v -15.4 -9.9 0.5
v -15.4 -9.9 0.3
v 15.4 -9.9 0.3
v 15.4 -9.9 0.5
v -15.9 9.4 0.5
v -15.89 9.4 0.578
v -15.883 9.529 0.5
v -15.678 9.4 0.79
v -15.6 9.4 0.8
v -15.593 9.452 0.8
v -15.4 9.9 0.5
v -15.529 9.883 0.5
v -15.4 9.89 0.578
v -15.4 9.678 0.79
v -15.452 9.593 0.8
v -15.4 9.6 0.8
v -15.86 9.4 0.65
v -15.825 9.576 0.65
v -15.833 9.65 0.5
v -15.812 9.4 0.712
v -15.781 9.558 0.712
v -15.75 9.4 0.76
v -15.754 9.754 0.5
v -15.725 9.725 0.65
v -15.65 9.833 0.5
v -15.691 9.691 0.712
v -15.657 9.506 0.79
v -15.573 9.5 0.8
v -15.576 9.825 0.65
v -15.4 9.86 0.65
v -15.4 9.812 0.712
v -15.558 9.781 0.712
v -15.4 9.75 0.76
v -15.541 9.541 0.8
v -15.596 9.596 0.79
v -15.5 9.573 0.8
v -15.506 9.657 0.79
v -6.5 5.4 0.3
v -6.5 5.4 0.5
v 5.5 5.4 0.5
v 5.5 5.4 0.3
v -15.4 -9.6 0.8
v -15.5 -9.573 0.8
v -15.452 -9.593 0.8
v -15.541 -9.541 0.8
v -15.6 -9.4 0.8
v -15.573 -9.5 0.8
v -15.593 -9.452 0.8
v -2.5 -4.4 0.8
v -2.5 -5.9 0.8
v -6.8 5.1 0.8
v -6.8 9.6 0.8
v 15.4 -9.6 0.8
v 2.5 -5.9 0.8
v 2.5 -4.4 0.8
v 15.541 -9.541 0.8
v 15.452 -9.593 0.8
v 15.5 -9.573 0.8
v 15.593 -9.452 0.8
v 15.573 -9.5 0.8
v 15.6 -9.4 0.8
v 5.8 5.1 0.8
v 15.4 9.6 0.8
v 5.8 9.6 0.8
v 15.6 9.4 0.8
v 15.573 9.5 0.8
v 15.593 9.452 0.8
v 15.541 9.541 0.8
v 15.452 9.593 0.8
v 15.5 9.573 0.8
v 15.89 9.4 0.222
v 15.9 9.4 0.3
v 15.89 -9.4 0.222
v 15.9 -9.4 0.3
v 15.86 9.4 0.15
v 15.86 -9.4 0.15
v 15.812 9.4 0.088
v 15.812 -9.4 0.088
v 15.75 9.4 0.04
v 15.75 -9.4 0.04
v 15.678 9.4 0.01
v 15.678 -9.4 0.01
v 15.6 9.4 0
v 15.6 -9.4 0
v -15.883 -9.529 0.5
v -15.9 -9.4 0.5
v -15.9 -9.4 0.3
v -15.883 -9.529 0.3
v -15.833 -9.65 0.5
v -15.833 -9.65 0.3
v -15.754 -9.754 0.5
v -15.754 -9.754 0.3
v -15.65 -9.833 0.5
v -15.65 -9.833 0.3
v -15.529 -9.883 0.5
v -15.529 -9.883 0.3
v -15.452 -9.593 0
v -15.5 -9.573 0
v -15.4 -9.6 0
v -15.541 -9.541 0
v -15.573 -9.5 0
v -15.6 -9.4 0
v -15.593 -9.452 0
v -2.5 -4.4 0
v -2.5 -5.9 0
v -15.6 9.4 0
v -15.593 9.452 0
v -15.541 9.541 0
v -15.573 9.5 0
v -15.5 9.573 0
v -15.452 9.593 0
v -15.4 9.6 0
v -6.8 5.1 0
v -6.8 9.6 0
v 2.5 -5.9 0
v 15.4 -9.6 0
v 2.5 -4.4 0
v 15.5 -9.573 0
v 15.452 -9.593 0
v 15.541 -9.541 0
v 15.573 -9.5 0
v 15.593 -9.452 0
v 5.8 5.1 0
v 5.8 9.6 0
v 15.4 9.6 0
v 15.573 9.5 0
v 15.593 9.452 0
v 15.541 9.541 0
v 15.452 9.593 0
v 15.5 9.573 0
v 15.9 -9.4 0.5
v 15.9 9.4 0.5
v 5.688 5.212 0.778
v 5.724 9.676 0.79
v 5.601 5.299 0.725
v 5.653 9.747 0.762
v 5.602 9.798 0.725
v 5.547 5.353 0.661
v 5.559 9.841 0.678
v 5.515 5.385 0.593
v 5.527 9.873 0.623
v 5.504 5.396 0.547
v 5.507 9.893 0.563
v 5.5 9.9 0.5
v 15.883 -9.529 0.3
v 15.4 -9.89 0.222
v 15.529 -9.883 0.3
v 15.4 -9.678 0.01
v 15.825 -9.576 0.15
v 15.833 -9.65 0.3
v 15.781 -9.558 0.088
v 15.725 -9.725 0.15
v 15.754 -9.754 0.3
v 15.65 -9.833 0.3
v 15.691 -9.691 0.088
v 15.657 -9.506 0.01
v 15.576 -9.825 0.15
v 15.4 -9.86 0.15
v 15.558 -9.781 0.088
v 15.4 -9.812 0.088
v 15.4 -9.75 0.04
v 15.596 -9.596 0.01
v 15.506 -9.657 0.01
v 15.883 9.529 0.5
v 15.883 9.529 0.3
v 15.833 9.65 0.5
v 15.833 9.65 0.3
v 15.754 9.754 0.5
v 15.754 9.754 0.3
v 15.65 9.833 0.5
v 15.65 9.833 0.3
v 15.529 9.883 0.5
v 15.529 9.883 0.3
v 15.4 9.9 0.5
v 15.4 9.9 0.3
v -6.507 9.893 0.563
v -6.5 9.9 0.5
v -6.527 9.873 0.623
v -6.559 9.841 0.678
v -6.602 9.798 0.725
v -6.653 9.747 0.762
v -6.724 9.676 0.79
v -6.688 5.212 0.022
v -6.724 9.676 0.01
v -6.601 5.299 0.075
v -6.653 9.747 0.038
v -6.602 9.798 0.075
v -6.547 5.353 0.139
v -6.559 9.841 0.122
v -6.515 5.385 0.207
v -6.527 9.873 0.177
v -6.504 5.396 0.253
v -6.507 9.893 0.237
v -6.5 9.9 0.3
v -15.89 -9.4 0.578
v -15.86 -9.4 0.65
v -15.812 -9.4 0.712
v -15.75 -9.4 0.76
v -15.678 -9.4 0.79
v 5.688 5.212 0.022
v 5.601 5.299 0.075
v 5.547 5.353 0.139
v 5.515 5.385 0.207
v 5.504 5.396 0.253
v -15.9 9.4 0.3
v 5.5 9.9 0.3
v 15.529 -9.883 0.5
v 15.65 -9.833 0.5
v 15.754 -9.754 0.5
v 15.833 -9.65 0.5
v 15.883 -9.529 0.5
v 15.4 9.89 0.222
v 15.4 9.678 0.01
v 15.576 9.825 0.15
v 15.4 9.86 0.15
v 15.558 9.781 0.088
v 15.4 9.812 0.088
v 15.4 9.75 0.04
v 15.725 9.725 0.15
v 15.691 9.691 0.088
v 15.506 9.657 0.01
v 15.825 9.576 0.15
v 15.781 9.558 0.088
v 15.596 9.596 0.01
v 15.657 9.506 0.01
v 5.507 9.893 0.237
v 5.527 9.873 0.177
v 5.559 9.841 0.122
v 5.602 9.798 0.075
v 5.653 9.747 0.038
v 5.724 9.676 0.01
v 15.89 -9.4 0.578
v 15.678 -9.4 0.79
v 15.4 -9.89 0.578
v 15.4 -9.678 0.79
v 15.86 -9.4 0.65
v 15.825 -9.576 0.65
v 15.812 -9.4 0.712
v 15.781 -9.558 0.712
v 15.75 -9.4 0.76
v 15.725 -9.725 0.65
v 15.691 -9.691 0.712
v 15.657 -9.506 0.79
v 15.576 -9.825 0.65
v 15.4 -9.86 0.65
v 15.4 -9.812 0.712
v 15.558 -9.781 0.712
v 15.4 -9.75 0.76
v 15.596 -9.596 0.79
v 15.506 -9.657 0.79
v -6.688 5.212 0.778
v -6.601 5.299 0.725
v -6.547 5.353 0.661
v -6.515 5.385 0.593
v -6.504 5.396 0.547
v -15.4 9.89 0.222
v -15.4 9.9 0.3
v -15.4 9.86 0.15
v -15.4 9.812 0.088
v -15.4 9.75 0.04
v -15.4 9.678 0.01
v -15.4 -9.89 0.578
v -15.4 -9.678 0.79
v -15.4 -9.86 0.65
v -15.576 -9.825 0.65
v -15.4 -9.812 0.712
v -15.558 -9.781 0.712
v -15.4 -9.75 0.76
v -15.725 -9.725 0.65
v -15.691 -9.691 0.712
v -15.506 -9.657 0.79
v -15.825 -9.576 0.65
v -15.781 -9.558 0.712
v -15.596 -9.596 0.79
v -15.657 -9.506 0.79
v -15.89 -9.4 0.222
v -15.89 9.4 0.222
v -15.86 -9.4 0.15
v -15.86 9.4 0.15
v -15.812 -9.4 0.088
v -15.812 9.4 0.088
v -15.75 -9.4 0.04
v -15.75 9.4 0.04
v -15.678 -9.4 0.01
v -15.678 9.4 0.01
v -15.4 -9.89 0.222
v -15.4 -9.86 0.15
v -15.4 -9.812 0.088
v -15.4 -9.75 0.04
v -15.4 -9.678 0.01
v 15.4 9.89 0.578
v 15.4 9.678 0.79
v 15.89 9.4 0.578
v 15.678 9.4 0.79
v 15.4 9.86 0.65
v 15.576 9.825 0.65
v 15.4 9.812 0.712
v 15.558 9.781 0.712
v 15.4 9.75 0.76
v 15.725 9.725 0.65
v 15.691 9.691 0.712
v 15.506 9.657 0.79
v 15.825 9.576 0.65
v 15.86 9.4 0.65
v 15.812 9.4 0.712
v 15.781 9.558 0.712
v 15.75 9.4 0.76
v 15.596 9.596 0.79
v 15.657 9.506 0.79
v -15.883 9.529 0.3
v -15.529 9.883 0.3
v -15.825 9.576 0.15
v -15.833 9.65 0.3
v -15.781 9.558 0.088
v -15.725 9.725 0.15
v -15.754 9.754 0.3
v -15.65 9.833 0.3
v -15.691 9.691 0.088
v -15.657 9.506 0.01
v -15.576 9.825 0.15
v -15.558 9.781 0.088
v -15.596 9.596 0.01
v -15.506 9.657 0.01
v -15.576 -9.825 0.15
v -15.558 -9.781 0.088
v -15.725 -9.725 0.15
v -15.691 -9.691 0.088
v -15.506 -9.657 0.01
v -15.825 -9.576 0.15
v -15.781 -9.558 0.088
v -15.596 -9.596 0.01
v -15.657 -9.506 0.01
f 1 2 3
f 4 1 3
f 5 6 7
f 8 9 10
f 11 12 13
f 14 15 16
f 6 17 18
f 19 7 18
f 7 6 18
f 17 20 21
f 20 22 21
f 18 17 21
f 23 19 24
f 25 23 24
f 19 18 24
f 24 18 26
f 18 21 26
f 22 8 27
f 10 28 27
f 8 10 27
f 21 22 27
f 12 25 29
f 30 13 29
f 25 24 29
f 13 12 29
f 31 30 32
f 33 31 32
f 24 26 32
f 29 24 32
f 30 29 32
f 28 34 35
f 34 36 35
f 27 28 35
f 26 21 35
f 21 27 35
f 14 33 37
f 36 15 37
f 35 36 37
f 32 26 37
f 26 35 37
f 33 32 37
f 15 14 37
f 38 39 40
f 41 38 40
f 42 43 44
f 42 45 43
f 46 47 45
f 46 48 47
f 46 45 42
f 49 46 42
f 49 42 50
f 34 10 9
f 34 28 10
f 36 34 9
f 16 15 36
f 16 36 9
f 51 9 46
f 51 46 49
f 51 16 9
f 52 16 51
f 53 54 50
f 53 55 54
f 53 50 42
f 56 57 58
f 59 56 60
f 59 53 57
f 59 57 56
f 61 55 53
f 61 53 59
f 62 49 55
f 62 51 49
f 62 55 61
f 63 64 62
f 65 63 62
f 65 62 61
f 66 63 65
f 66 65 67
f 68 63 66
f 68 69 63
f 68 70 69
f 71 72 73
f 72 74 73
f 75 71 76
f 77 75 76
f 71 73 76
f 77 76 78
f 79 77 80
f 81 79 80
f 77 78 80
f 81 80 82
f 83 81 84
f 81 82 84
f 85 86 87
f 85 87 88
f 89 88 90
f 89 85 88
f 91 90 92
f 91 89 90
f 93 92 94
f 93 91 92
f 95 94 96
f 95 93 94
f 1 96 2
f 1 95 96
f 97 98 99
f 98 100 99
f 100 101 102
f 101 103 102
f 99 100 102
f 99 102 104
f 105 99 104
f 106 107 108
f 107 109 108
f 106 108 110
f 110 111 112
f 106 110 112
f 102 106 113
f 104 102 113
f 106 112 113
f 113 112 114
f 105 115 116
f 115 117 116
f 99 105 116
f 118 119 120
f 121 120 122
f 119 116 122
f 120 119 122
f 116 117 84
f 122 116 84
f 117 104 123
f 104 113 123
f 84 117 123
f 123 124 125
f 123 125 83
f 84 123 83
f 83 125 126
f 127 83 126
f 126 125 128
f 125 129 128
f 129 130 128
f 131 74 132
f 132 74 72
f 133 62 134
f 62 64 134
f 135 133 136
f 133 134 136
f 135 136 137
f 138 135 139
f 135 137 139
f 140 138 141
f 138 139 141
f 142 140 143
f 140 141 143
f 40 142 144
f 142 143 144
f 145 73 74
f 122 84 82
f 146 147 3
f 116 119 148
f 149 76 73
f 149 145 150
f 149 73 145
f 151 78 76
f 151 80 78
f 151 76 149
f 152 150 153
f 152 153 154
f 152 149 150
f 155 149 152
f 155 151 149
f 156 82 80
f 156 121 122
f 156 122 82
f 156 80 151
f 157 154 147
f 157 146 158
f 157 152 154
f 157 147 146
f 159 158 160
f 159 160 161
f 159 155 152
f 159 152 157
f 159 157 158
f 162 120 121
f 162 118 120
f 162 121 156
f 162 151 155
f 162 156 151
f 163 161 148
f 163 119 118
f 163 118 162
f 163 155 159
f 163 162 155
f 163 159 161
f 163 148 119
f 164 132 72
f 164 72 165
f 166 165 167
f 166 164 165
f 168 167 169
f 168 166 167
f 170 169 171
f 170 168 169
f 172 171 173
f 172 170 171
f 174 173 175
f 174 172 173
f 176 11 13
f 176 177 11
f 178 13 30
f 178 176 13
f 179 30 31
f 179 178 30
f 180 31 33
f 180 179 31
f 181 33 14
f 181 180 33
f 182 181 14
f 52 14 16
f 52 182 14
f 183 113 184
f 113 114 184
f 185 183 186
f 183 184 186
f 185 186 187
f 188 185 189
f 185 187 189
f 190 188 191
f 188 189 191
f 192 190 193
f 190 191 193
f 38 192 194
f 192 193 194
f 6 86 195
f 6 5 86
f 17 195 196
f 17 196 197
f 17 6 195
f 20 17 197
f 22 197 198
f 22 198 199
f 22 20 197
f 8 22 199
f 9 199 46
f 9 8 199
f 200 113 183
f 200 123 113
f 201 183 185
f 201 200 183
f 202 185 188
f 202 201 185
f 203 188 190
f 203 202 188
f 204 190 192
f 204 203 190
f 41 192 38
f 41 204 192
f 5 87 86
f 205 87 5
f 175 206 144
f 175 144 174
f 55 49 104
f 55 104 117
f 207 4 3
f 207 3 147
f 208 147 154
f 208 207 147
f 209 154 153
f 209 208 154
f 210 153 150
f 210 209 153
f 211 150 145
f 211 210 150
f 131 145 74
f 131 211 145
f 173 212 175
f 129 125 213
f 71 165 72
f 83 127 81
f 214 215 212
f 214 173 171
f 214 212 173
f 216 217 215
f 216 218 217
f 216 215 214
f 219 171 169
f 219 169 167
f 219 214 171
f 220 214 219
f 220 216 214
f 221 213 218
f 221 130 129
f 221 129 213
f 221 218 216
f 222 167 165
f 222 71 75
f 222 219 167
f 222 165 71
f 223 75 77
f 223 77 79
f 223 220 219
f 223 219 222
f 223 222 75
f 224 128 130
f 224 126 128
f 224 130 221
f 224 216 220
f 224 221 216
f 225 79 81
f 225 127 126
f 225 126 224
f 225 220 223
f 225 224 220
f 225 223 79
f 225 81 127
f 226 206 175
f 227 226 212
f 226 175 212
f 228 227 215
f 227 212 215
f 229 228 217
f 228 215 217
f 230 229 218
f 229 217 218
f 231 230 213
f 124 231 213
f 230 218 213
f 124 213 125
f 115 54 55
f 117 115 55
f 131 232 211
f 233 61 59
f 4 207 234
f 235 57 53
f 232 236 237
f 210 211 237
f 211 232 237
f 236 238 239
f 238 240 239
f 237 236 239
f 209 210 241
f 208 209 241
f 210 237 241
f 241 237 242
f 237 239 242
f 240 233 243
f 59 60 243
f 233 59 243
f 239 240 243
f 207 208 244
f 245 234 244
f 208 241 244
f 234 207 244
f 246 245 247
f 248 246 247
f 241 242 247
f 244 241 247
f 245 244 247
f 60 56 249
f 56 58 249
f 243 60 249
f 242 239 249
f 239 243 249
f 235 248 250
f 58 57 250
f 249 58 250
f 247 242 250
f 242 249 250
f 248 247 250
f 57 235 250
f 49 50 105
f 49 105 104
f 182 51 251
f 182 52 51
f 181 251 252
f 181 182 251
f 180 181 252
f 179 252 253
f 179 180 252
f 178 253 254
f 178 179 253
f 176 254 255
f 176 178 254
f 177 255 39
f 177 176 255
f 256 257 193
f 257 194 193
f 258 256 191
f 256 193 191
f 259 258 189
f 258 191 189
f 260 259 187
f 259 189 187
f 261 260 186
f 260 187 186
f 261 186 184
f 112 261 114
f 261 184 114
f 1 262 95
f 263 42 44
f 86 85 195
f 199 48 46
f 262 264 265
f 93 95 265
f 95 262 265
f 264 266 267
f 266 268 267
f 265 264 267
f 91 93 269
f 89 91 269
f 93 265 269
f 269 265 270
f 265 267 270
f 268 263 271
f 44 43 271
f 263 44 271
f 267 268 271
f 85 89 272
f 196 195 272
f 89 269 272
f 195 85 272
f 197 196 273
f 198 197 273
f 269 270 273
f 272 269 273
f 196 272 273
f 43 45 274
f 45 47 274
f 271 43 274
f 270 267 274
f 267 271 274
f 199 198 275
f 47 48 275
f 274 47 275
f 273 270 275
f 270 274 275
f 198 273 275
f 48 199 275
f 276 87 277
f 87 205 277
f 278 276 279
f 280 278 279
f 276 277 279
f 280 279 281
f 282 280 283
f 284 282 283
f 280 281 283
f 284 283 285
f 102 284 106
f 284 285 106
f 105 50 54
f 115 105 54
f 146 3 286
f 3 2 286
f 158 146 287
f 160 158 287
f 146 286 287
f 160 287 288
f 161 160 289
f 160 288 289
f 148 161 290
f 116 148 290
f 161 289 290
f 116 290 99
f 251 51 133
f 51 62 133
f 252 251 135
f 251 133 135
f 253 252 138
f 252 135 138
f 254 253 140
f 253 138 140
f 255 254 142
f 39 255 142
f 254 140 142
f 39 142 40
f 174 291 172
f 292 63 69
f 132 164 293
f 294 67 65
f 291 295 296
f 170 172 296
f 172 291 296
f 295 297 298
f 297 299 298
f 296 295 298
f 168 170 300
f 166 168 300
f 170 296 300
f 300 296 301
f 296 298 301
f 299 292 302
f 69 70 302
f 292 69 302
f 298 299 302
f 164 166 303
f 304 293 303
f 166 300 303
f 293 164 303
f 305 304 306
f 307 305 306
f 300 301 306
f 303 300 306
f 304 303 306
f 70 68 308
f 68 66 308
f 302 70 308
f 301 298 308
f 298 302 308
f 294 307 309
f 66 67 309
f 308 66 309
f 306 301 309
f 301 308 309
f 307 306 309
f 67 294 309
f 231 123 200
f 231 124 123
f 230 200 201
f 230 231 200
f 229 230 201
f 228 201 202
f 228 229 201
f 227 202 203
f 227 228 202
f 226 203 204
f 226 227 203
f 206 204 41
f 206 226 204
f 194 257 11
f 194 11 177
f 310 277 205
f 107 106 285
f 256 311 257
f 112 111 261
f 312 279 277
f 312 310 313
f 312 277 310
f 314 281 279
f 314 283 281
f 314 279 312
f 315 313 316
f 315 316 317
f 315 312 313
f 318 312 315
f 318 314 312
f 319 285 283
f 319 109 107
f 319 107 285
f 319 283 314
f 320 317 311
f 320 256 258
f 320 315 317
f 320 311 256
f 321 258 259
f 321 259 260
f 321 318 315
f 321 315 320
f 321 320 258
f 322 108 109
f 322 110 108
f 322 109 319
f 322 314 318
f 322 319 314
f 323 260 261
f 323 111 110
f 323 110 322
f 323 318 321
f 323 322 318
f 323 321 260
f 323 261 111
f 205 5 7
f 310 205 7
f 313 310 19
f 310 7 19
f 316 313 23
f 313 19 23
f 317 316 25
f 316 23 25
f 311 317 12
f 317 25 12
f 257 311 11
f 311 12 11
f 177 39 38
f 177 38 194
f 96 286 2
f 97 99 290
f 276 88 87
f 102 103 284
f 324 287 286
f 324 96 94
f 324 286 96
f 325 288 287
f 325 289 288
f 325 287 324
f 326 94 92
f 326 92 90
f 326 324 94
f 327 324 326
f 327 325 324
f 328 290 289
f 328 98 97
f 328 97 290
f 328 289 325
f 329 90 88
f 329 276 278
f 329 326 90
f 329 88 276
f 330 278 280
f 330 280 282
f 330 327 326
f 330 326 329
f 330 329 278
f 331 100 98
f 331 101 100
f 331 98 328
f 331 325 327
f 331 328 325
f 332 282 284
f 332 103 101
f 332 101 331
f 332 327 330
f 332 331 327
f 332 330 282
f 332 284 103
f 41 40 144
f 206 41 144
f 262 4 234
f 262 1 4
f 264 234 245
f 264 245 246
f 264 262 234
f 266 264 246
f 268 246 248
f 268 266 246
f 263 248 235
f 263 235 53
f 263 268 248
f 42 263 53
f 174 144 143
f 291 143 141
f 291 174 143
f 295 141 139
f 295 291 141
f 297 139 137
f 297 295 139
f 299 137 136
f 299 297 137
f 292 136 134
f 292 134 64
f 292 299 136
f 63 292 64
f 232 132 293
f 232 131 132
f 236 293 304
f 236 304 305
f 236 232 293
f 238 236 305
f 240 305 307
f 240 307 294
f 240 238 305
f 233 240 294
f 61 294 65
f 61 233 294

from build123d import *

# Parameters (mm, degrees)
SKETCH006_W     = 31.8
SKETCH006_H     = 19.8
PAD001_DEPTH    = 0.8
SKETCH007_W     = 12
SKETCH007_H     = 4.5
POCKET005_DEPTH = 0.801
SKETCH008_W     = 5
SKETCH008_H     = 1.5
POCKET006_DEPTH = 0.801
FILLET002_R     = 0.5
FILLET003_R     = 0.3


with BuildPart() as part:
    # Sketch006 → Pad001 (new body)
    with BuildSketch(Plane.XY):
        Rectangle(SKETCH006_W, SKETCH006_H)
    extrude(amount=PAD001_DEPTH)

    # Sketch007 (on Face6 of Pad001) → Pocket005 (cut, through all)
    with BuildSketch(Plane.XY.offset(0.8)):
        with Locations((-0.5, 7.65)):
            Rectangle(SKETCH007_W, SKETCH007_H)
    extrude(amount=-POCKET005_DEPTH, mode=Mode.SUBTRACT)

    # Sketch008 (on Face4 of Pocket005) → Pocket006 (cut, through all)
    with BuildSketch(Plane.XY.offset(0.8)):
        with Locations((0, -5.15)):
            Rectangle(SKETCH008_W, SKETCH008_H)
    extrude(amount=-POCKET006_DEPTH, mode=Mode.SUBTRACT)

    # Fillet002
    fillet002_edges = [part.edges().sort_by_distance(p)[0] for p in [
        (15.9, -9.9, 0.4),
        (15.9, 9.9, 0.4),
        (-15.9, 9.9, 0.4),
        (-15.9, -9.9, 0.4),
    ]]
    fillet(fillet002_edges, radius=FILLET002_R)

    # Fillet003
    fillet003_edges = [part.edges().sort_by_distance(p)[0] for p in [
        (-15.9, 0, 0.8),
        (-15.9, 0, 0),
        (-10.95, 9.9, 0),
        (-10.95, 9.9, 0.8),
        (-0.5, 5.4, 0.8),
        (-0.5, 5.4, 0),
        (5.5, 7.65, 0),
        (5.5, 7.65, 0.8),
        (-6.5, 7.65, 0.8),
        (10.45, 9.9, 0),
        (10.45, 9.9, 0.8),
        (15.9, 0, 0.8),
        (15.9, 0, 0),
        (-6.5, 7.65, 0),
    ]]
    fillet(fillet003_edges, radius=FILLET003_R)


solid = part.part
